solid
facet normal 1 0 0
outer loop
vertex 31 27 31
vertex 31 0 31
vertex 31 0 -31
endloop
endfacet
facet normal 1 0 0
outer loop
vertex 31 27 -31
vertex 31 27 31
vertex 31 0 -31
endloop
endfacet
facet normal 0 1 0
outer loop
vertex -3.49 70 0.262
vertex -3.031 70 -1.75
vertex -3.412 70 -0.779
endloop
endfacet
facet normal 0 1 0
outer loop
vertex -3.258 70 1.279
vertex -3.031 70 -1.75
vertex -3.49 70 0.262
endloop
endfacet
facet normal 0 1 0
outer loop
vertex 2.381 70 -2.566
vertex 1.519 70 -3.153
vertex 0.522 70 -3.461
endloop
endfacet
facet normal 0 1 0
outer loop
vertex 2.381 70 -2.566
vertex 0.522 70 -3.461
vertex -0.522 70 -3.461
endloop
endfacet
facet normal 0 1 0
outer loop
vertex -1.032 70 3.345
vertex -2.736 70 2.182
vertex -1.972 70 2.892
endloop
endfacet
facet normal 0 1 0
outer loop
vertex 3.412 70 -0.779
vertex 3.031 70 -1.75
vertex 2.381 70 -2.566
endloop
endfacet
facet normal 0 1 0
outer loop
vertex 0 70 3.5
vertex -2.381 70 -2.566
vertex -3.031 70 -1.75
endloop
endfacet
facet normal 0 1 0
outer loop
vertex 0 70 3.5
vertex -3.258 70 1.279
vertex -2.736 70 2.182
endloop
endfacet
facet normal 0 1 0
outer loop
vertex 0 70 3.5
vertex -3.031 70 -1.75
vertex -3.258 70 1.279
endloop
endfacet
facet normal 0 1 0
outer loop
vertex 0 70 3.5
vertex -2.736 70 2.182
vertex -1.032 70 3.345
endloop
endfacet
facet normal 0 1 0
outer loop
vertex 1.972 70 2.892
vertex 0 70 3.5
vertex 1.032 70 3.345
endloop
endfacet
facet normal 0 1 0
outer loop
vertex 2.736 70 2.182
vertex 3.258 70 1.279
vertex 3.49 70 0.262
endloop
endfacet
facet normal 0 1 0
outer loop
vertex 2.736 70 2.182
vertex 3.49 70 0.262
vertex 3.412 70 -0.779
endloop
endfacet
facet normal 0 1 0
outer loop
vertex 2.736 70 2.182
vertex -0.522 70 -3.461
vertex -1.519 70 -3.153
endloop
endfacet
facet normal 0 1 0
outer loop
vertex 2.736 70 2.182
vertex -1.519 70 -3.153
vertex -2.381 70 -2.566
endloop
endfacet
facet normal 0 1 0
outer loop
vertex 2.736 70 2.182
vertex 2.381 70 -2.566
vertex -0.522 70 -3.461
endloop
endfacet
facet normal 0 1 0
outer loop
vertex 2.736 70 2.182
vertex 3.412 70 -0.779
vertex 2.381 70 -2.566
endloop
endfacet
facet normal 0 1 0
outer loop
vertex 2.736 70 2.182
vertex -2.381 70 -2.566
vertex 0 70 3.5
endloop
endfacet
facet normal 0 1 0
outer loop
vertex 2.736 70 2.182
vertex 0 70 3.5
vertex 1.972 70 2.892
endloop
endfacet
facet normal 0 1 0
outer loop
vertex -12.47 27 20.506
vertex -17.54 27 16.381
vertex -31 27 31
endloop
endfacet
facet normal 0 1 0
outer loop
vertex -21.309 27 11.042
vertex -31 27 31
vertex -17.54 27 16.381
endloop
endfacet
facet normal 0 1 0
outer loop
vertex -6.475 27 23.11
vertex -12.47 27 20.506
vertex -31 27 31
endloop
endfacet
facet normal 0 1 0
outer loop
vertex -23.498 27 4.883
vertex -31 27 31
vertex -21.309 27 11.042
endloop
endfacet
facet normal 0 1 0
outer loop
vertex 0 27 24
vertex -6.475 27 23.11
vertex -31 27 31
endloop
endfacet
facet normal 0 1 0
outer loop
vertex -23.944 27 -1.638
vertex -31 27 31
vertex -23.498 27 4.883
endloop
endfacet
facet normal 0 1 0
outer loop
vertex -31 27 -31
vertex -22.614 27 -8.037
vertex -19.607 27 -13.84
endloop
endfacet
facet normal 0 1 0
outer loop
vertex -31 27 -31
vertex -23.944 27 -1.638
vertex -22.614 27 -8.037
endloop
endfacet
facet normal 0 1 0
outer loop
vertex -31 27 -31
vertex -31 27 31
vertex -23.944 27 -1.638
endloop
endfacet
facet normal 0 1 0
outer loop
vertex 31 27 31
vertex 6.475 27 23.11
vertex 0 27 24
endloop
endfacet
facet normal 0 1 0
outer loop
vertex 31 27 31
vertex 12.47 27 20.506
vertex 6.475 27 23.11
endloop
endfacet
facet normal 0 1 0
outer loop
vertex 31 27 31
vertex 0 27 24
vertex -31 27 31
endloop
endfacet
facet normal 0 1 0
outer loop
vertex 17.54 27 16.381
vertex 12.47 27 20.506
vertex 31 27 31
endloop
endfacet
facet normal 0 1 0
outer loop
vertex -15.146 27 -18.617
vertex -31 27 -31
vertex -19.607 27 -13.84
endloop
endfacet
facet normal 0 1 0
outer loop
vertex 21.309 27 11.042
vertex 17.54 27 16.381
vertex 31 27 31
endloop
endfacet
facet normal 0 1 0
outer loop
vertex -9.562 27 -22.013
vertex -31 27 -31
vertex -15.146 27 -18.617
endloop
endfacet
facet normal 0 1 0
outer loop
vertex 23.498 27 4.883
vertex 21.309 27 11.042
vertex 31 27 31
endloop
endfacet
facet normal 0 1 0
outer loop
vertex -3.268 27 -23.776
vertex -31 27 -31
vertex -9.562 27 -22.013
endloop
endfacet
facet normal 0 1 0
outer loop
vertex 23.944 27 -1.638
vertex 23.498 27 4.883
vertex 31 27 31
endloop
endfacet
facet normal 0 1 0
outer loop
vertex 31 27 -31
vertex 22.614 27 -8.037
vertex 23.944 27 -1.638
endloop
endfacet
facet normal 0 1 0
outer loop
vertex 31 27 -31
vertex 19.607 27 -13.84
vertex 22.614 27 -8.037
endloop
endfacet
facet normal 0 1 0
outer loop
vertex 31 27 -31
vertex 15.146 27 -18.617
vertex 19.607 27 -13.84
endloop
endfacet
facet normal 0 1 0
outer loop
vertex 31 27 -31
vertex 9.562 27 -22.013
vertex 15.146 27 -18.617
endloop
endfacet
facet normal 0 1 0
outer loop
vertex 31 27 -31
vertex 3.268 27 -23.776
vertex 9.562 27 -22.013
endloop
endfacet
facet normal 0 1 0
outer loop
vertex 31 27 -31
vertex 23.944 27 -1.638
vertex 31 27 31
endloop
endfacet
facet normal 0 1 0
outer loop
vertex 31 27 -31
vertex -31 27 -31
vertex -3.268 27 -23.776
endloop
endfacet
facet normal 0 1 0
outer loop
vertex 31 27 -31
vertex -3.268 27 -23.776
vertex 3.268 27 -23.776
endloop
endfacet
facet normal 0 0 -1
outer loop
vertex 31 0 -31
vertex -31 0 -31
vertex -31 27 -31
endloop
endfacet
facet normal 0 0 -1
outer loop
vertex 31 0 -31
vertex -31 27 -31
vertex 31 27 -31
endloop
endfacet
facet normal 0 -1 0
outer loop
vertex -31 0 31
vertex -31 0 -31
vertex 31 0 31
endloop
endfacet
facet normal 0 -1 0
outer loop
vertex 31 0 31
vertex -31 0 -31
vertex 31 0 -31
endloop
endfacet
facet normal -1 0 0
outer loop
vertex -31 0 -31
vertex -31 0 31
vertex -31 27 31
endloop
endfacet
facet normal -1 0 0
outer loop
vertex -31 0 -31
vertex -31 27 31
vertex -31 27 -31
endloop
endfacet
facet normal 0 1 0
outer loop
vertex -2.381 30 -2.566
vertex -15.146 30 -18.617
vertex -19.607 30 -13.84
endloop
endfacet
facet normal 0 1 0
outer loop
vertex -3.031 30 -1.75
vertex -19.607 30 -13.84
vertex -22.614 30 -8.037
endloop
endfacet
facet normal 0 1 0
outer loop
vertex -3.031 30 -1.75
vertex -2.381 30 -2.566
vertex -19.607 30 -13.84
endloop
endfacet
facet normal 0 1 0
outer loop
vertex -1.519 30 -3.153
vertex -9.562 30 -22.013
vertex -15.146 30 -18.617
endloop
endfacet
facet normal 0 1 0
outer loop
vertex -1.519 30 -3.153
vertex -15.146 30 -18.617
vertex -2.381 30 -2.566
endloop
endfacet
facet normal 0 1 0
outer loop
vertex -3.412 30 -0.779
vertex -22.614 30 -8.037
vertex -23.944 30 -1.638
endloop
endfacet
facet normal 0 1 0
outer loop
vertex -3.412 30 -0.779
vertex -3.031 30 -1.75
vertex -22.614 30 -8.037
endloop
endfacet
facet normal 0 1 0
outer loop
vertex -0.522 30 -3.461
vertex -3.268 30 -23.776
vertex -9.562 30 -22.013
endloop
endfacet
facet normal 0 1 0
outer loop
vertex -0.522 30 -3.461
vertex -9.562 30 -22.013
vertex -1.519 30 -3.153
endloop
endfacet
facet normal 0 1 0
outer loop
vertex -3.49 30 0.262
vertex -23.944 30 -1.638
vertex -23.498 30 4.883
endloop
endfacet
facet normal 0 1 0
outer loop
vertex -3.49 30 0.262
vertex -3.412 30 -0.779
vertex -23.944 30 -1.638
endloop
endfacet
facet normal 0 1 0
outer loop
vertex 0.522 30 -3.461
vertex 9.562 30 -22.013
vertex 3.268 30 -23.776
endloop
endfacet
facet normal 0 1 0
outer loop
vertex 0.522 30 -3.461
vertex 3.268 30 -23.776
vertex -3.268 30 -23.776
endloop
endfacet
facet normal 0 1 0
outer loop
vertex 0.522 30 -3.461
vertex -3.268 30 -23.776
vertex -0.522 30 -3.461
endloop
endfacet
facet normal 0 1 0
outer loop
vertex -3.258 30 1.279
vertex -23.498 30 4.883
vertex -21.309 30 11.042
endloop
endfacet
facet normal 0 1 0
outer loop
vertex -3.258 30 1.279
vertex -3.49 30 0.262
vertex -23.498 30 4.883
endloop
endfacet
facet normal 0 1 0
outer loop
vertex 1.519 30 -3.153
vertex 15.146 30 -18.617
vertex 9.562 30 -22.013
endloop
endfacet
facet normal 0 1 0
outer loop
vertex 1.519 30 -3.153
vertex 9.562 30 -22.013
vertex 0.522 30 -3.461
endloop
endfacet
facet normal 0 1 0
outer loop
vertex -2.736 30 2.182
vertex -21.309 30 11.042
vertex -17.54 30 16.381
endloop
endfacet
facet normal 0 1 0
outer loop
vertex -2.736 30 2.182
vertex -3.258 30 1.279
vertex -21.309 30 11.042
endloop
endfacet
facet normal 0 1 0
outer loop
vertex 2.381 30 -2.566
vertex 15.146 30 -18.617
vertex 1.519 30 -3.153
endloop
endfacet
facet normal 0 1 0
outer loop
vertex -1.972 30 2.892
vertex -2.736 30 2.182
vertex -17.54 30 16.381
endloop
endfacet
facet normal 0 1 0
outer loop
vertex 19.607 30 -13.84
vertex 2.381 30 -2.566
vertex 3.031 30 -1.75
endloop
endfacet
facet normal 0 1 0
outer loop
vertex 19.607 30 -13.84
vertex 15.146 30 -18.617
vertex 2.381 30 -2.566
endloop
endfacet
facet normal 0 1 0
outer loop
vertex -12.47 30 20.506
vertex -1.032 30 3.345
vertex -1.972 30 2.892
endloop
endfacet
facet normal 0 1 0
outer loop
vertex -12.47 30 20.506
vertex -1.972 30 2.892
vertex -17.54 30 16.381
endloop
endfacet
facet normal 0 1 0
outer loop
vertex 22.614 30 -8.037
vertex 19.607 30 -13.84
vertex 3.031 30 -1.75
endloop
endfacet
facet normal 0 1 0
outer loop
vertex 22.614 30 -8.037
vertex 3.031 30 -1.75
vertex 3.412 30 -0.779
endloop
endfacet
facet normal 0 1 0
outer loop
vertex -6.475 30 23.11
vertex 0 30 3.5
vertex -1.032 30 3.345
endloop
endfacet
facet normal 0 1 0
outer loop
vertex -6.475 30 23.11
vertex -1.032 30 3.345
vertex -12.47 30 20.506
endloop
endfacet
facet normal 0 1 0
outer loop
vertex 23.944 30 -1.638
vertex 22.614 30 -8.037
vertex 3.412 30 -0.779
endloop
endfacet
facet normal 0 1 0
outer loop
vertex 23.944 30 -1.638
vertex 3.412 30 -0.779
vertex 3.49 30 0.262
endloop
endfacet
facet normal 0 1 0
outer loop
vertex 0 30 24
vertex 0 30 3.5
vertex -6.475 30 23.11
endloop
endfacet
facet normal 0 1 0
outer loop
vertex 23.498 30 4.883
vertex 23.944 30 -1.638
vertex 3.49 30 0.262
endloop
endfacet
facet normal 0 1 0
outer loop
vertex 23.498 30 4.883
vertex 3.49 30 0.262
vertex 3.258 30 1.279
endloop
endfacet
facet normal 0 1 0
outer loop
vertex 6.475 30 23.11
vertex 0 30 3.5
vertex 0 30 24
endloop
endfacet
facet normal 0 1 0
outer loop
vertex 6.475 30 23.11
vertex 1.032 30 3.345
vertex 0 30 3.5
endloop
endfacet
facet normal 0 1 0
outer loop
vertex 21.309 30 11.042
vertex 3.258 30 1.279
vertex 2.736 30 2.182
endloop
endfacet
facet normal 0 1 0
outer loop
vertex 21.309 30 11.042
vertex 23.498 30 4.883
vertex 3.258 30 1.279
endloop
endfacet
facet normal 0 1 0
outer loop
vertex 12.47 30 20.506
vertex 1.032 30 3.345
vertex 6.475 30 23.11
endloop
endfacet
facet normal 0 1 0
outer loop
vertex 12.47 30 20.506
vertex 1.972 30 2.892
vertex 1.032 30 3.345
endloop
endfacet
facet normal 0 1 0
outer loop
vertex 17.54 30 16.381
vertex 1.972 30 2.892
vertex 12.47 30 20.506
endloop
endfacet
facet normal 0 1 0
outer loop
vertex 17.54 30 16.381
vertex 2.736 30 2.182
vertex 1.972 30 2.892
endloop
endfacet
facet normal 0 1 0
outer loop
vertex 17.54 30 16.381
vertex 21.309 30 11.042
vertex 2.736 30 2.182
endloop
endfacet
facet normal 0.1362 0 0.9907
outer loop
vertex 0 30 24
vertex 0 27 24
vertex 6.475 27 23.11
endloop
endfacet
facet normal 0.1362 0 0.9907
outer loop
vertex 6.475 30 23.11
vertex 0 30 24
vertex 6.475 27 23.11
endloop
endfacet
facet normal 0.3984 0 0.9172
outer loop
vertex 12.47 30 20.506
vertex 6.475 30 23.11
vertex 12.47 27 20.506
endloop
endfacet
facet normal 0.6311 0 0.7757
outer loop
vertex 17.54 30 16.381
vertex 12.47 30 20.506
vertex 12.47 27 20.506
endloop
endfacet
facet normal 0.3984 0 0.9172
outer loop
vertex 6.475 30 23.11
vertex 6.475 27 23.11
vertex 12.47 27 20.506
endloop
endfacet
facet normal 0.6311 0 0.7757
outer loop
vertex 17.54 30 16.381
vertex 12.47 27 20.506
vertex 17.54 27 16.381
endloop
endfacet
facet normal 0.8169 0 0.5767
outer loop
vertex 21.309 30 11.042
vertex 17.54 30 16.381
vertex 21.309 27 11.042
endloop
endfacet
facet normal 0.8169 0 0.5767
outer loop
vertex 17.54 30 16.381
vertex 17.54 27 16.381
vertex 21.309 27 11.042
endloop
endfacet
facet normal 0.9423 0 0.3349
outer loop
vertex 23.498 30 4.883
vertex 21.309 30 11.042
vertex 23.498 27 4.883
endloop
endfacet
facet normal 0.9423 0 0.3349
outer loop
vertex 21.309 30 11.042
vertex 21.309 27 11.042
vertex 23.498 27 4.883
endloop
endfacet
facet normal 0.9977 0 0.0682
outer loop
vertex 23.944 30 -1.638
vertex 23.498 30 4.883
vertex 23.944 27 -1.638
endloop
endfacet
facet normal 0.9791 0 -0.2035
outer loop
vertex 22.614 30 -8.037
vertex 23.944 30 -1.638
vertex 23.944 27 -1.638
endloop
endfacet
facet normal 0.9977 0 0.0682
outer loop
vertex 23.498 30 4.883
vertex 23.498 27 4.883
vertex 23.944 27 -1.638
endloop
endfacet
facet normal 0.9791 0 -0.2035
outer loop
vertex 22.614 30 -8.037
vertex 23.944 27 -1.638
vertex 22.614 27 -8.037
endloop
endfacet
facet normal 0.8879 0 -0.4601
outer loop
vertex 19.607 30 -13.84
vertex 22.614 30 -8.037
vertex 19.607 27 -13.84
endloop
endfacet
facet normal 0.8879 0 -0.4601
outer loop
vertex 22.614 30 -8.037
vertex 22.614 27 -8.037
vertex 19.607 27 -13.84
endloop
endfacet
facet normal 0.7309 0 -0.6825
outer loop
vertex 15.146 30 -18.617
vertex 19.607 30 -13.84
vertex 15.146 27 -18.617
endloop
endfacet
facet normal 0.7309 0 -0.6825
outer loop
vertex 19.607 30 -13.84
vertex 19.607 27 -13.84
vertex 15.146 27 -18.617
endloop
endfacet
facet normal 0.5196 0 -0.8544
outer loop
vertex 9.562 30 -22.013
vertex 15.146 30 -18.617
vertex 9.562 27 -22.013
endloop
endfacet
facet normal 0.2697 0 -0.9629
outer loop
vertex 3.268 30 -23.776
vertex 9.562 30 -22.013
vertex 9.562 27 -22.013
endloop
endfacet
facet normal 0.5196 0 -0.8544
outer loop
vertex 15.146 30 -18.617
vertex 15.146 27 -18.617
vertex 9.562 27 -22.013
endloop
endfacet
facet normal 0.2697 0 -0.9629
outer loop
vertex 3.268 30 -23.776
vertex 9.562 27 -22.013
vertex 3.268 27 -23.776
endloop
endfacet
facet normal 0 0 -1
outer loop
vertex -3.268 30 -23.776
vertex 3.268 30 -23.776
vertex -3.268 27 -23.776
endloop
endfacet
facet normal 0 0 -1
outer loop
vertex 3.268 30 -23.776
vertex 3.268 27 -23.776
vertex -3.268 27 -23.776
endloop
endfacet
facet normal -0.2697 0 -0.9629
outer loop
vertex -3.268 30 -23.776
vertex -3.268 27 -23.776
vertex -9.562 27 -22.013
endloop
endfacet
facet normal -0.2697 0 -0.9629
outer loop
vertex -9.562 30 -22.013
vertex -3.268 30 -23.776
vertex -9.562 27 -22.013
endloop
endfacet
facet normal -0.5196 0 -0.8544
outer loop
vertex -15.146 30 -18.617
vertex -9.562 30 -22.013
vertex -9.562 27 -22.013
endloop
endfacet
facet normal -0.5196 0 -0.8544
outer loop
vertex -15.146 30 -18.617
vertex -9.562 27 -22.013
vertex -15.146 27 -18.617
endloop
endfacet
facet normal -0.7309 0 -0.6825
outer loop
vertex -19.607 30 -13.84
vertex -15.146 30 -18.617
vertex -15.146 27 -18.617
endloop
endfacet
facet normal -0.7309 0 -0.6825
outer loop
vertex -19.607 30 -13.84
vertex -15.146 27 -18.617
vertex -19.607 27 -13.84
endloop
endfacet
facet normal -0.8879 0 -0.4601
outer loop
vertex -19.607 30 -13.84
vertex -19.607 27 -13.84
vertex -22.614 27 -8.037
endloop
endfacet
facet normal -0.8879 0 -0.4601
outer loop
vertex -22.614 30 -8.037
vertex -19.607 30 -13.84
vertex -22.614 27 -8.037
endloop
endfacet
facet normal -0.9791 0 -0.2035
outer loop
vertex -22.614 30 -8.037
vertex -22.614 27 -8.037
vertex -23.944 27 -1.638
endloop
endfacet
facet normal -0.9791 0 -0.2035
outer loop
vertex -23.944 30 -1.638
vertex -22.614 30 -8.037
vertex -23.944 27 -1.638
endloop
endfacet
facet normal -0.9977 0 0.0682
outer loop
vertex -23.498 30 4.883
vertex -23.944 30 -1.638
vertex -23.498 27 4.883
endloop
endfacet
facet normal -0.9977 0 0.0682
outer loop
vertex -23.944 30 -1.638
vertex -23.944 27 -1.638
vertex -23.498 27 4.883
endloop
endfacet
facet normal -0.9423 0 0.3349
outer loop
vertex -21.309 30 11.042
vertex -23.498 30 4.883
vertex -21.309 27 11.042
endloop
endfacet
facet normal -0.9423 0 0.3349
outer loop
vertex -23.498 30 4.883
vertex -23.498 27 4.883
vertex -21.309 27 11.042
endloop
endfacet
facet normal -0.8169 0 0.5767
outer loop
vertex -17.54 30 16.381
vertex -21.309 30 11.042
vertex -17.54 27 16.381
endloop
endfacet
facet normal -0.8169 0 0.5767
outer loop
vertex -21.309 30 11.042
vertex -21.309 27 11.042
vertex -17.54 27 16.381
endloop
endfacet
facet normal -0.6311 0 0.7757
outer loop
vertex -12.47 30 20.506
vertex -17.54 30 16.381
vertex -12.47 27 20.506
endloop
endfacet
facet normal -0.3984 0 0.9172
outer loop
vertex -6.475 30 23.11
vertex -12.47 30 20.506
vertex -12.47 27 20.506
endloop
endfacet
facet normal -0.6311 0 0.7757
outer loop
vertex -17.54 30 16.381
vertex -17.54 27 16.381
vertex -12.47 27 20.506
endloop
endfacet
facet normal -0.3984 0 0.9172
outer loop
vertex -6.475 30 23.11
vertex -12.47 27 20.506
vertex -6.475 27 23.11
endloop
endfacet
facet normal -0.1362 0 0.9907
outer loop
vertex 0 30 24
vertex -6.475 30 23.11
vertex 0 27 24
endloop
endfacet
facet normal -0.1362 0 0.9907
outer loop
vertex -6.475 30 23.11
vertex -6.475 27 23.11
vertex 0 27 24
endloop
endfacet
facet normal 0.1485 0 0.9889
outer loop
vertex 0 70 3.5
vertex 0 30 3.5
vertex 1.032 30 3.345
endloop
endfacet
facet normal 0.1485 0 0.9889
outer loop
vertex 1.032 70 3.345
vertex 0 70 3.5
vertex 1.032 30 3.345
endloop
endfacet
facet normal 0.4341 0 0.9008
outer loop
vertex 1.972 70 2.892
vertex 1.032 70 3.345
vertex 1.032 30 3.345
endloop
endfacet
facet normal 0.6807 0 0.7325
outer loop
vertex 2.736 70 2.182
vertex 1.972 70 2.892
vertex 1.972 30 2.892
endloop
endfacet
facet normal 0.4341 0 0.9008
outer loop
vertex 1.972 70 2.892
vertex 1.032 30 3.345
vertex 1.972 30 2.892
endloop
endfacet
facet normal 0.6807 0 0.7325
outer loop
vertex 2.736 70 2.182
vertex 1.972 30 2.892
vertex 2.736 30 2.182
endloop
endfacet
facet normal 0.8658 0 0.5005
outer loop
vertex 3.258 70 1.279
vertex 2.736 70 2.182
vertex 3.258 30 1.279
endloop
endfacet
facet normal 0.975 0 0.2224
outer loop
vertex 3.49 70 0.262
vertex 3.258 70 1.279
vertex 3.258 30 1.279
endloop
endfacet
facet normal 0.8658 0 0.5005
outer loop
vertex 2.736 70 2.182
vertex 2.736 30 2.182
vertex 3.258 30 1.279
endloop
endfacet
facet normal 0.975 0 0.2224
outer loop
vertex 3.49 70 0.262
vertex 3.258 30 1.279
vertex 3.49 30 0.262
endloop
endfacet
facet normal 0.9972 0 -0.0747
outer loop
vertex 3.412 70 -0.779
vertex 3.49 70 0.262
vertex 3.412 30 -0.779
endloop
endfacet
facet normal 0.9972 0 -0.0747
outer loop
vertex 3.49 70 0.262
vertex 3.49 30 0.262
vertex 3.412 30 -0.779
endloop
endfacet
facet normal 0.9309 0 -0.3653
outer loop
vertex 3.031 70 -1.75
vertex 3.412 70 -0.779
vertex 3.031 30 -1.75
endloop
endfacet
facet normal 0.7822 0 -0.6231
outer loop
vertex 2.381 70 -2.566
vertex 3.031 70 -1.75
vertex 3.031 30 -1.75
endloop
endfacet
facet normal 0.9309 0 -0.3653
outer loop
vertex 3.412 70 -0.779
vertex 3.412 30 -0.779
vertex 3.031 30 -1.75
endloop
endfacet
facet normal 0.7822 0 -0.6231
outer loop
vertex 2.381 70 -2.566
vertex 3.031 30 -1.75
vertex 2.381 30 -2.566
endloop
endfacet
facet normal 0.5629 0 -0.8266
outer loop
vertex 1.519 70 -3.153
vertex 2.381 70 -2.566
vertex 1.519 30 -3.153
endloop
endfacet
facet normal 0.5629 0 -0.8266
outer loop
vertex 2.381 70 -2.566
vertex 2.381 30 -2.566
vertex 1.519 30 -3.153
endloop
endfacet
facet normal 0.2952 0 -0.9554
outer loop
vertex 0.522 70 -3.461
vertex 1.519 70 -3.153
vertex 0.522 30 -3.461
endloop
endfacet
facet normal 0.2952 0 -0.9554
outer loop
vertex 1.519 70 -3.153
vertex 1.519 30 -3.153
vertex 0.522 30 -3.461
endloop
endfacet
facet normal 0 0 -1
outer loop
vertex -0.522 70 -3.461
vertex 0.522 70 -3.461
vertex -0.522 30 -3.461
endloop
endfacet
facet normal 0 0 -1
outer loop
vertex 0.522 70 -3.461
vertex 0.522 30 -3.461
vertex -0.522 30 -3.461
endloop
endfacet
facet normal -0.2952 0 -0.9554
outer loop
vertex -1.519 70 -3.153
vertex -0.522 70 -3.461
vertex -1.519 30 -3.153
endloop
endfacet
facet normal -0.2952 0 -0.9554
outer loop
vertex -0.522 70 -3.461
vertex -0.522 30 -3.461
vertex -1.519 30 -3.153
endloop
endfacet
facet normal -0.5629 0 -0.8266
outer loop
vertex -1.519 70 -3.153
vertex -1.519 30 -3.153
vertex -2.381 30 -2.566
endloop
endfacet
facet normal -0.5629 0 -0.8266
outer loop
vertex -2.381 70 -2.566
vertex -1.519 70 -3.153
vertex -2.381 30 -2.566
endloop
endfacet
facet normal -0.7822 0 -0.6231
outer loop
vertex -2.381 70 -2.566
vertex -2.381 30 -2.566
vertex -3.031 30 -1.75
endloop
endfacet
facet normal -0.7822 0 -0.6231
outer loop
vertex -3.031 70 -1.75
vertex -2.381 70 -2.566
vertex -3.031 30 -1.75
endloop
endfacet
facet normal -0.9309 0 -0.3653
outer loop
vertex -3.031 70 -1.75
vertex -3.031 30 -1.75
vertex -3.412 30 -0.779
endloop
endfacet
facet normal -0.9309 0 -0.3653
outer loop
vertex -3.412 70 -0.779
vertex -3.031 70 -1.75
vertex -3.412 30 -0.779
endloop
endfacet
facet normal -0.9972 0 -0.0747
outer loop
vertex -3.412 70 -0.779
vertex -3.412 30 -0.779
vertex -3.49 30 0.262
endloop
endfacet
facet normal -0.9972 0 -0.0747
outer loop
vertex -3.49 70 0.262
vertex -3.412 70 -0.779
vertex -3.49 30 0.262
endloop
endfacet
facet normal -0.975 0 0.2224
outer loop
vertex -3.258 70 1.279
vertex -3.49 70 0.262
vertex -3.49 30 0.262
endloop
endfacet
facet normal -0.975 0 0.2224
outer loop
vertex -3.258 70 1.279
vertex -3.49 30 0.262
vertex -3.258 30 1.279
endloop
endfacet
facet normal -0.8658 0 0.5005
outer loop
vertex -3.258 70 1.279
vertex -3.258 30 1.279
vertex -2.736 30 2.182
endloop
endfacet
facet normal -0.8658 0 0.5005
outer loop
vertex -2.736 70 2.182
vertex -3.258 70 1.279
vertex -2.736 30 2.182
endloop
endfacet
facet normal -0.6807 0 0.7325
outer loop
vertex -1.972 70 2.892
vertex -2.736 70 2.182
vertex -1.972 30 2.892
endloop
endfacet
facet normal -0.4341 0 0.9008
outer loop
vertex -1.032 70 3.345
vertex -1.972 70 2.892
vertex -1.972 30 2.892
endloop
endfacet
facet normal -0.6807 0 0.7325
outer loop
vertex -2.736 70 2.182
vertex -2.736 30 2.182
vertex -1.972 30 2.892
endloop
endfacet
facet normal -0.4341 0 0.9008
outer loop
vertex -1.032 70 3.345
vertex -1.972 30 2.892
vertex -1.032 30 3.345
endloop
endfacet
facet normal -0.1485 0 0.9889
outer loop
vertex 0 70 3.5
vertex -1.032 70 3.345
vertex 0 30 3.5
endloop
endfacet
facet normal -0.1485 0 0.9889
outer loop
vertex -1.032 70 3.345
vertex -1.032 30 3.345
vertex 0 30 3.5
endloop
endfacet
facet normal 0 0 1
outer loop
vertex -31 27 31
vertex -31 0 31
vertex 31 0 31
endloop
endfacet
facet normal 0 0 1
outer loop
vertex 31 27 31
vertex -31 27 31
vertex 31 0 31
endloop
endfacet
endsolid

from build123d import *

# Parameters (mm, degrees)
ESQUISSE2_W        = 62
ESQUISSE2_H        = 62
BOSS_EXTRU_1_DEPTH = 27
ESQUISSE3_R        = 24
BOSS_EXTRU_2_DEPTH = 3
ESQUISSE4_R        = 3.5
BOSS_EXTRU_3_DEPTH = 40


with BuildPart() as part:
    # Esquisse2 → Boss.-Extru.1 (new body)
    with BuildSketch(Plane(origin=(0, 0, 0), x_dir=(1, 0, 0), z_dir=(0, 1, 0))):
        Rectangle(ESQUISSE2_W, ESQUISSE2_H)
    extrude(amount=BOSS_EXTRU_1_DEPTH)

    # Esquisse3 → Boss.-Extru.2 (add)
    with BuildSketch(Plane(origin=(0, 27, 0), x_dir=(1, 0, 0), z_dir=(0, 1, 0))):
        with Locations(Location((0, 0, 0), (0, 0, 270))):
            Circle(ESQUISSE3_R)
    extrude(amount=BOSS_EXTRU_2_DEPTH)

    # Esquisse4 → Boss.-Extru.3 (add)
    with BuildSketch(Plane(origin=(0, 30, 0), x_dir=(1, 0, 0), z_dir=(0, 1, 0))):
        with Locations(Location((0, 0, 0), (0, 0, 270))):
            Circle(ESQUISSE4_R)
    extrude(amount=BOSS_EXTRU_3_DEPTH)


solid = part.part
